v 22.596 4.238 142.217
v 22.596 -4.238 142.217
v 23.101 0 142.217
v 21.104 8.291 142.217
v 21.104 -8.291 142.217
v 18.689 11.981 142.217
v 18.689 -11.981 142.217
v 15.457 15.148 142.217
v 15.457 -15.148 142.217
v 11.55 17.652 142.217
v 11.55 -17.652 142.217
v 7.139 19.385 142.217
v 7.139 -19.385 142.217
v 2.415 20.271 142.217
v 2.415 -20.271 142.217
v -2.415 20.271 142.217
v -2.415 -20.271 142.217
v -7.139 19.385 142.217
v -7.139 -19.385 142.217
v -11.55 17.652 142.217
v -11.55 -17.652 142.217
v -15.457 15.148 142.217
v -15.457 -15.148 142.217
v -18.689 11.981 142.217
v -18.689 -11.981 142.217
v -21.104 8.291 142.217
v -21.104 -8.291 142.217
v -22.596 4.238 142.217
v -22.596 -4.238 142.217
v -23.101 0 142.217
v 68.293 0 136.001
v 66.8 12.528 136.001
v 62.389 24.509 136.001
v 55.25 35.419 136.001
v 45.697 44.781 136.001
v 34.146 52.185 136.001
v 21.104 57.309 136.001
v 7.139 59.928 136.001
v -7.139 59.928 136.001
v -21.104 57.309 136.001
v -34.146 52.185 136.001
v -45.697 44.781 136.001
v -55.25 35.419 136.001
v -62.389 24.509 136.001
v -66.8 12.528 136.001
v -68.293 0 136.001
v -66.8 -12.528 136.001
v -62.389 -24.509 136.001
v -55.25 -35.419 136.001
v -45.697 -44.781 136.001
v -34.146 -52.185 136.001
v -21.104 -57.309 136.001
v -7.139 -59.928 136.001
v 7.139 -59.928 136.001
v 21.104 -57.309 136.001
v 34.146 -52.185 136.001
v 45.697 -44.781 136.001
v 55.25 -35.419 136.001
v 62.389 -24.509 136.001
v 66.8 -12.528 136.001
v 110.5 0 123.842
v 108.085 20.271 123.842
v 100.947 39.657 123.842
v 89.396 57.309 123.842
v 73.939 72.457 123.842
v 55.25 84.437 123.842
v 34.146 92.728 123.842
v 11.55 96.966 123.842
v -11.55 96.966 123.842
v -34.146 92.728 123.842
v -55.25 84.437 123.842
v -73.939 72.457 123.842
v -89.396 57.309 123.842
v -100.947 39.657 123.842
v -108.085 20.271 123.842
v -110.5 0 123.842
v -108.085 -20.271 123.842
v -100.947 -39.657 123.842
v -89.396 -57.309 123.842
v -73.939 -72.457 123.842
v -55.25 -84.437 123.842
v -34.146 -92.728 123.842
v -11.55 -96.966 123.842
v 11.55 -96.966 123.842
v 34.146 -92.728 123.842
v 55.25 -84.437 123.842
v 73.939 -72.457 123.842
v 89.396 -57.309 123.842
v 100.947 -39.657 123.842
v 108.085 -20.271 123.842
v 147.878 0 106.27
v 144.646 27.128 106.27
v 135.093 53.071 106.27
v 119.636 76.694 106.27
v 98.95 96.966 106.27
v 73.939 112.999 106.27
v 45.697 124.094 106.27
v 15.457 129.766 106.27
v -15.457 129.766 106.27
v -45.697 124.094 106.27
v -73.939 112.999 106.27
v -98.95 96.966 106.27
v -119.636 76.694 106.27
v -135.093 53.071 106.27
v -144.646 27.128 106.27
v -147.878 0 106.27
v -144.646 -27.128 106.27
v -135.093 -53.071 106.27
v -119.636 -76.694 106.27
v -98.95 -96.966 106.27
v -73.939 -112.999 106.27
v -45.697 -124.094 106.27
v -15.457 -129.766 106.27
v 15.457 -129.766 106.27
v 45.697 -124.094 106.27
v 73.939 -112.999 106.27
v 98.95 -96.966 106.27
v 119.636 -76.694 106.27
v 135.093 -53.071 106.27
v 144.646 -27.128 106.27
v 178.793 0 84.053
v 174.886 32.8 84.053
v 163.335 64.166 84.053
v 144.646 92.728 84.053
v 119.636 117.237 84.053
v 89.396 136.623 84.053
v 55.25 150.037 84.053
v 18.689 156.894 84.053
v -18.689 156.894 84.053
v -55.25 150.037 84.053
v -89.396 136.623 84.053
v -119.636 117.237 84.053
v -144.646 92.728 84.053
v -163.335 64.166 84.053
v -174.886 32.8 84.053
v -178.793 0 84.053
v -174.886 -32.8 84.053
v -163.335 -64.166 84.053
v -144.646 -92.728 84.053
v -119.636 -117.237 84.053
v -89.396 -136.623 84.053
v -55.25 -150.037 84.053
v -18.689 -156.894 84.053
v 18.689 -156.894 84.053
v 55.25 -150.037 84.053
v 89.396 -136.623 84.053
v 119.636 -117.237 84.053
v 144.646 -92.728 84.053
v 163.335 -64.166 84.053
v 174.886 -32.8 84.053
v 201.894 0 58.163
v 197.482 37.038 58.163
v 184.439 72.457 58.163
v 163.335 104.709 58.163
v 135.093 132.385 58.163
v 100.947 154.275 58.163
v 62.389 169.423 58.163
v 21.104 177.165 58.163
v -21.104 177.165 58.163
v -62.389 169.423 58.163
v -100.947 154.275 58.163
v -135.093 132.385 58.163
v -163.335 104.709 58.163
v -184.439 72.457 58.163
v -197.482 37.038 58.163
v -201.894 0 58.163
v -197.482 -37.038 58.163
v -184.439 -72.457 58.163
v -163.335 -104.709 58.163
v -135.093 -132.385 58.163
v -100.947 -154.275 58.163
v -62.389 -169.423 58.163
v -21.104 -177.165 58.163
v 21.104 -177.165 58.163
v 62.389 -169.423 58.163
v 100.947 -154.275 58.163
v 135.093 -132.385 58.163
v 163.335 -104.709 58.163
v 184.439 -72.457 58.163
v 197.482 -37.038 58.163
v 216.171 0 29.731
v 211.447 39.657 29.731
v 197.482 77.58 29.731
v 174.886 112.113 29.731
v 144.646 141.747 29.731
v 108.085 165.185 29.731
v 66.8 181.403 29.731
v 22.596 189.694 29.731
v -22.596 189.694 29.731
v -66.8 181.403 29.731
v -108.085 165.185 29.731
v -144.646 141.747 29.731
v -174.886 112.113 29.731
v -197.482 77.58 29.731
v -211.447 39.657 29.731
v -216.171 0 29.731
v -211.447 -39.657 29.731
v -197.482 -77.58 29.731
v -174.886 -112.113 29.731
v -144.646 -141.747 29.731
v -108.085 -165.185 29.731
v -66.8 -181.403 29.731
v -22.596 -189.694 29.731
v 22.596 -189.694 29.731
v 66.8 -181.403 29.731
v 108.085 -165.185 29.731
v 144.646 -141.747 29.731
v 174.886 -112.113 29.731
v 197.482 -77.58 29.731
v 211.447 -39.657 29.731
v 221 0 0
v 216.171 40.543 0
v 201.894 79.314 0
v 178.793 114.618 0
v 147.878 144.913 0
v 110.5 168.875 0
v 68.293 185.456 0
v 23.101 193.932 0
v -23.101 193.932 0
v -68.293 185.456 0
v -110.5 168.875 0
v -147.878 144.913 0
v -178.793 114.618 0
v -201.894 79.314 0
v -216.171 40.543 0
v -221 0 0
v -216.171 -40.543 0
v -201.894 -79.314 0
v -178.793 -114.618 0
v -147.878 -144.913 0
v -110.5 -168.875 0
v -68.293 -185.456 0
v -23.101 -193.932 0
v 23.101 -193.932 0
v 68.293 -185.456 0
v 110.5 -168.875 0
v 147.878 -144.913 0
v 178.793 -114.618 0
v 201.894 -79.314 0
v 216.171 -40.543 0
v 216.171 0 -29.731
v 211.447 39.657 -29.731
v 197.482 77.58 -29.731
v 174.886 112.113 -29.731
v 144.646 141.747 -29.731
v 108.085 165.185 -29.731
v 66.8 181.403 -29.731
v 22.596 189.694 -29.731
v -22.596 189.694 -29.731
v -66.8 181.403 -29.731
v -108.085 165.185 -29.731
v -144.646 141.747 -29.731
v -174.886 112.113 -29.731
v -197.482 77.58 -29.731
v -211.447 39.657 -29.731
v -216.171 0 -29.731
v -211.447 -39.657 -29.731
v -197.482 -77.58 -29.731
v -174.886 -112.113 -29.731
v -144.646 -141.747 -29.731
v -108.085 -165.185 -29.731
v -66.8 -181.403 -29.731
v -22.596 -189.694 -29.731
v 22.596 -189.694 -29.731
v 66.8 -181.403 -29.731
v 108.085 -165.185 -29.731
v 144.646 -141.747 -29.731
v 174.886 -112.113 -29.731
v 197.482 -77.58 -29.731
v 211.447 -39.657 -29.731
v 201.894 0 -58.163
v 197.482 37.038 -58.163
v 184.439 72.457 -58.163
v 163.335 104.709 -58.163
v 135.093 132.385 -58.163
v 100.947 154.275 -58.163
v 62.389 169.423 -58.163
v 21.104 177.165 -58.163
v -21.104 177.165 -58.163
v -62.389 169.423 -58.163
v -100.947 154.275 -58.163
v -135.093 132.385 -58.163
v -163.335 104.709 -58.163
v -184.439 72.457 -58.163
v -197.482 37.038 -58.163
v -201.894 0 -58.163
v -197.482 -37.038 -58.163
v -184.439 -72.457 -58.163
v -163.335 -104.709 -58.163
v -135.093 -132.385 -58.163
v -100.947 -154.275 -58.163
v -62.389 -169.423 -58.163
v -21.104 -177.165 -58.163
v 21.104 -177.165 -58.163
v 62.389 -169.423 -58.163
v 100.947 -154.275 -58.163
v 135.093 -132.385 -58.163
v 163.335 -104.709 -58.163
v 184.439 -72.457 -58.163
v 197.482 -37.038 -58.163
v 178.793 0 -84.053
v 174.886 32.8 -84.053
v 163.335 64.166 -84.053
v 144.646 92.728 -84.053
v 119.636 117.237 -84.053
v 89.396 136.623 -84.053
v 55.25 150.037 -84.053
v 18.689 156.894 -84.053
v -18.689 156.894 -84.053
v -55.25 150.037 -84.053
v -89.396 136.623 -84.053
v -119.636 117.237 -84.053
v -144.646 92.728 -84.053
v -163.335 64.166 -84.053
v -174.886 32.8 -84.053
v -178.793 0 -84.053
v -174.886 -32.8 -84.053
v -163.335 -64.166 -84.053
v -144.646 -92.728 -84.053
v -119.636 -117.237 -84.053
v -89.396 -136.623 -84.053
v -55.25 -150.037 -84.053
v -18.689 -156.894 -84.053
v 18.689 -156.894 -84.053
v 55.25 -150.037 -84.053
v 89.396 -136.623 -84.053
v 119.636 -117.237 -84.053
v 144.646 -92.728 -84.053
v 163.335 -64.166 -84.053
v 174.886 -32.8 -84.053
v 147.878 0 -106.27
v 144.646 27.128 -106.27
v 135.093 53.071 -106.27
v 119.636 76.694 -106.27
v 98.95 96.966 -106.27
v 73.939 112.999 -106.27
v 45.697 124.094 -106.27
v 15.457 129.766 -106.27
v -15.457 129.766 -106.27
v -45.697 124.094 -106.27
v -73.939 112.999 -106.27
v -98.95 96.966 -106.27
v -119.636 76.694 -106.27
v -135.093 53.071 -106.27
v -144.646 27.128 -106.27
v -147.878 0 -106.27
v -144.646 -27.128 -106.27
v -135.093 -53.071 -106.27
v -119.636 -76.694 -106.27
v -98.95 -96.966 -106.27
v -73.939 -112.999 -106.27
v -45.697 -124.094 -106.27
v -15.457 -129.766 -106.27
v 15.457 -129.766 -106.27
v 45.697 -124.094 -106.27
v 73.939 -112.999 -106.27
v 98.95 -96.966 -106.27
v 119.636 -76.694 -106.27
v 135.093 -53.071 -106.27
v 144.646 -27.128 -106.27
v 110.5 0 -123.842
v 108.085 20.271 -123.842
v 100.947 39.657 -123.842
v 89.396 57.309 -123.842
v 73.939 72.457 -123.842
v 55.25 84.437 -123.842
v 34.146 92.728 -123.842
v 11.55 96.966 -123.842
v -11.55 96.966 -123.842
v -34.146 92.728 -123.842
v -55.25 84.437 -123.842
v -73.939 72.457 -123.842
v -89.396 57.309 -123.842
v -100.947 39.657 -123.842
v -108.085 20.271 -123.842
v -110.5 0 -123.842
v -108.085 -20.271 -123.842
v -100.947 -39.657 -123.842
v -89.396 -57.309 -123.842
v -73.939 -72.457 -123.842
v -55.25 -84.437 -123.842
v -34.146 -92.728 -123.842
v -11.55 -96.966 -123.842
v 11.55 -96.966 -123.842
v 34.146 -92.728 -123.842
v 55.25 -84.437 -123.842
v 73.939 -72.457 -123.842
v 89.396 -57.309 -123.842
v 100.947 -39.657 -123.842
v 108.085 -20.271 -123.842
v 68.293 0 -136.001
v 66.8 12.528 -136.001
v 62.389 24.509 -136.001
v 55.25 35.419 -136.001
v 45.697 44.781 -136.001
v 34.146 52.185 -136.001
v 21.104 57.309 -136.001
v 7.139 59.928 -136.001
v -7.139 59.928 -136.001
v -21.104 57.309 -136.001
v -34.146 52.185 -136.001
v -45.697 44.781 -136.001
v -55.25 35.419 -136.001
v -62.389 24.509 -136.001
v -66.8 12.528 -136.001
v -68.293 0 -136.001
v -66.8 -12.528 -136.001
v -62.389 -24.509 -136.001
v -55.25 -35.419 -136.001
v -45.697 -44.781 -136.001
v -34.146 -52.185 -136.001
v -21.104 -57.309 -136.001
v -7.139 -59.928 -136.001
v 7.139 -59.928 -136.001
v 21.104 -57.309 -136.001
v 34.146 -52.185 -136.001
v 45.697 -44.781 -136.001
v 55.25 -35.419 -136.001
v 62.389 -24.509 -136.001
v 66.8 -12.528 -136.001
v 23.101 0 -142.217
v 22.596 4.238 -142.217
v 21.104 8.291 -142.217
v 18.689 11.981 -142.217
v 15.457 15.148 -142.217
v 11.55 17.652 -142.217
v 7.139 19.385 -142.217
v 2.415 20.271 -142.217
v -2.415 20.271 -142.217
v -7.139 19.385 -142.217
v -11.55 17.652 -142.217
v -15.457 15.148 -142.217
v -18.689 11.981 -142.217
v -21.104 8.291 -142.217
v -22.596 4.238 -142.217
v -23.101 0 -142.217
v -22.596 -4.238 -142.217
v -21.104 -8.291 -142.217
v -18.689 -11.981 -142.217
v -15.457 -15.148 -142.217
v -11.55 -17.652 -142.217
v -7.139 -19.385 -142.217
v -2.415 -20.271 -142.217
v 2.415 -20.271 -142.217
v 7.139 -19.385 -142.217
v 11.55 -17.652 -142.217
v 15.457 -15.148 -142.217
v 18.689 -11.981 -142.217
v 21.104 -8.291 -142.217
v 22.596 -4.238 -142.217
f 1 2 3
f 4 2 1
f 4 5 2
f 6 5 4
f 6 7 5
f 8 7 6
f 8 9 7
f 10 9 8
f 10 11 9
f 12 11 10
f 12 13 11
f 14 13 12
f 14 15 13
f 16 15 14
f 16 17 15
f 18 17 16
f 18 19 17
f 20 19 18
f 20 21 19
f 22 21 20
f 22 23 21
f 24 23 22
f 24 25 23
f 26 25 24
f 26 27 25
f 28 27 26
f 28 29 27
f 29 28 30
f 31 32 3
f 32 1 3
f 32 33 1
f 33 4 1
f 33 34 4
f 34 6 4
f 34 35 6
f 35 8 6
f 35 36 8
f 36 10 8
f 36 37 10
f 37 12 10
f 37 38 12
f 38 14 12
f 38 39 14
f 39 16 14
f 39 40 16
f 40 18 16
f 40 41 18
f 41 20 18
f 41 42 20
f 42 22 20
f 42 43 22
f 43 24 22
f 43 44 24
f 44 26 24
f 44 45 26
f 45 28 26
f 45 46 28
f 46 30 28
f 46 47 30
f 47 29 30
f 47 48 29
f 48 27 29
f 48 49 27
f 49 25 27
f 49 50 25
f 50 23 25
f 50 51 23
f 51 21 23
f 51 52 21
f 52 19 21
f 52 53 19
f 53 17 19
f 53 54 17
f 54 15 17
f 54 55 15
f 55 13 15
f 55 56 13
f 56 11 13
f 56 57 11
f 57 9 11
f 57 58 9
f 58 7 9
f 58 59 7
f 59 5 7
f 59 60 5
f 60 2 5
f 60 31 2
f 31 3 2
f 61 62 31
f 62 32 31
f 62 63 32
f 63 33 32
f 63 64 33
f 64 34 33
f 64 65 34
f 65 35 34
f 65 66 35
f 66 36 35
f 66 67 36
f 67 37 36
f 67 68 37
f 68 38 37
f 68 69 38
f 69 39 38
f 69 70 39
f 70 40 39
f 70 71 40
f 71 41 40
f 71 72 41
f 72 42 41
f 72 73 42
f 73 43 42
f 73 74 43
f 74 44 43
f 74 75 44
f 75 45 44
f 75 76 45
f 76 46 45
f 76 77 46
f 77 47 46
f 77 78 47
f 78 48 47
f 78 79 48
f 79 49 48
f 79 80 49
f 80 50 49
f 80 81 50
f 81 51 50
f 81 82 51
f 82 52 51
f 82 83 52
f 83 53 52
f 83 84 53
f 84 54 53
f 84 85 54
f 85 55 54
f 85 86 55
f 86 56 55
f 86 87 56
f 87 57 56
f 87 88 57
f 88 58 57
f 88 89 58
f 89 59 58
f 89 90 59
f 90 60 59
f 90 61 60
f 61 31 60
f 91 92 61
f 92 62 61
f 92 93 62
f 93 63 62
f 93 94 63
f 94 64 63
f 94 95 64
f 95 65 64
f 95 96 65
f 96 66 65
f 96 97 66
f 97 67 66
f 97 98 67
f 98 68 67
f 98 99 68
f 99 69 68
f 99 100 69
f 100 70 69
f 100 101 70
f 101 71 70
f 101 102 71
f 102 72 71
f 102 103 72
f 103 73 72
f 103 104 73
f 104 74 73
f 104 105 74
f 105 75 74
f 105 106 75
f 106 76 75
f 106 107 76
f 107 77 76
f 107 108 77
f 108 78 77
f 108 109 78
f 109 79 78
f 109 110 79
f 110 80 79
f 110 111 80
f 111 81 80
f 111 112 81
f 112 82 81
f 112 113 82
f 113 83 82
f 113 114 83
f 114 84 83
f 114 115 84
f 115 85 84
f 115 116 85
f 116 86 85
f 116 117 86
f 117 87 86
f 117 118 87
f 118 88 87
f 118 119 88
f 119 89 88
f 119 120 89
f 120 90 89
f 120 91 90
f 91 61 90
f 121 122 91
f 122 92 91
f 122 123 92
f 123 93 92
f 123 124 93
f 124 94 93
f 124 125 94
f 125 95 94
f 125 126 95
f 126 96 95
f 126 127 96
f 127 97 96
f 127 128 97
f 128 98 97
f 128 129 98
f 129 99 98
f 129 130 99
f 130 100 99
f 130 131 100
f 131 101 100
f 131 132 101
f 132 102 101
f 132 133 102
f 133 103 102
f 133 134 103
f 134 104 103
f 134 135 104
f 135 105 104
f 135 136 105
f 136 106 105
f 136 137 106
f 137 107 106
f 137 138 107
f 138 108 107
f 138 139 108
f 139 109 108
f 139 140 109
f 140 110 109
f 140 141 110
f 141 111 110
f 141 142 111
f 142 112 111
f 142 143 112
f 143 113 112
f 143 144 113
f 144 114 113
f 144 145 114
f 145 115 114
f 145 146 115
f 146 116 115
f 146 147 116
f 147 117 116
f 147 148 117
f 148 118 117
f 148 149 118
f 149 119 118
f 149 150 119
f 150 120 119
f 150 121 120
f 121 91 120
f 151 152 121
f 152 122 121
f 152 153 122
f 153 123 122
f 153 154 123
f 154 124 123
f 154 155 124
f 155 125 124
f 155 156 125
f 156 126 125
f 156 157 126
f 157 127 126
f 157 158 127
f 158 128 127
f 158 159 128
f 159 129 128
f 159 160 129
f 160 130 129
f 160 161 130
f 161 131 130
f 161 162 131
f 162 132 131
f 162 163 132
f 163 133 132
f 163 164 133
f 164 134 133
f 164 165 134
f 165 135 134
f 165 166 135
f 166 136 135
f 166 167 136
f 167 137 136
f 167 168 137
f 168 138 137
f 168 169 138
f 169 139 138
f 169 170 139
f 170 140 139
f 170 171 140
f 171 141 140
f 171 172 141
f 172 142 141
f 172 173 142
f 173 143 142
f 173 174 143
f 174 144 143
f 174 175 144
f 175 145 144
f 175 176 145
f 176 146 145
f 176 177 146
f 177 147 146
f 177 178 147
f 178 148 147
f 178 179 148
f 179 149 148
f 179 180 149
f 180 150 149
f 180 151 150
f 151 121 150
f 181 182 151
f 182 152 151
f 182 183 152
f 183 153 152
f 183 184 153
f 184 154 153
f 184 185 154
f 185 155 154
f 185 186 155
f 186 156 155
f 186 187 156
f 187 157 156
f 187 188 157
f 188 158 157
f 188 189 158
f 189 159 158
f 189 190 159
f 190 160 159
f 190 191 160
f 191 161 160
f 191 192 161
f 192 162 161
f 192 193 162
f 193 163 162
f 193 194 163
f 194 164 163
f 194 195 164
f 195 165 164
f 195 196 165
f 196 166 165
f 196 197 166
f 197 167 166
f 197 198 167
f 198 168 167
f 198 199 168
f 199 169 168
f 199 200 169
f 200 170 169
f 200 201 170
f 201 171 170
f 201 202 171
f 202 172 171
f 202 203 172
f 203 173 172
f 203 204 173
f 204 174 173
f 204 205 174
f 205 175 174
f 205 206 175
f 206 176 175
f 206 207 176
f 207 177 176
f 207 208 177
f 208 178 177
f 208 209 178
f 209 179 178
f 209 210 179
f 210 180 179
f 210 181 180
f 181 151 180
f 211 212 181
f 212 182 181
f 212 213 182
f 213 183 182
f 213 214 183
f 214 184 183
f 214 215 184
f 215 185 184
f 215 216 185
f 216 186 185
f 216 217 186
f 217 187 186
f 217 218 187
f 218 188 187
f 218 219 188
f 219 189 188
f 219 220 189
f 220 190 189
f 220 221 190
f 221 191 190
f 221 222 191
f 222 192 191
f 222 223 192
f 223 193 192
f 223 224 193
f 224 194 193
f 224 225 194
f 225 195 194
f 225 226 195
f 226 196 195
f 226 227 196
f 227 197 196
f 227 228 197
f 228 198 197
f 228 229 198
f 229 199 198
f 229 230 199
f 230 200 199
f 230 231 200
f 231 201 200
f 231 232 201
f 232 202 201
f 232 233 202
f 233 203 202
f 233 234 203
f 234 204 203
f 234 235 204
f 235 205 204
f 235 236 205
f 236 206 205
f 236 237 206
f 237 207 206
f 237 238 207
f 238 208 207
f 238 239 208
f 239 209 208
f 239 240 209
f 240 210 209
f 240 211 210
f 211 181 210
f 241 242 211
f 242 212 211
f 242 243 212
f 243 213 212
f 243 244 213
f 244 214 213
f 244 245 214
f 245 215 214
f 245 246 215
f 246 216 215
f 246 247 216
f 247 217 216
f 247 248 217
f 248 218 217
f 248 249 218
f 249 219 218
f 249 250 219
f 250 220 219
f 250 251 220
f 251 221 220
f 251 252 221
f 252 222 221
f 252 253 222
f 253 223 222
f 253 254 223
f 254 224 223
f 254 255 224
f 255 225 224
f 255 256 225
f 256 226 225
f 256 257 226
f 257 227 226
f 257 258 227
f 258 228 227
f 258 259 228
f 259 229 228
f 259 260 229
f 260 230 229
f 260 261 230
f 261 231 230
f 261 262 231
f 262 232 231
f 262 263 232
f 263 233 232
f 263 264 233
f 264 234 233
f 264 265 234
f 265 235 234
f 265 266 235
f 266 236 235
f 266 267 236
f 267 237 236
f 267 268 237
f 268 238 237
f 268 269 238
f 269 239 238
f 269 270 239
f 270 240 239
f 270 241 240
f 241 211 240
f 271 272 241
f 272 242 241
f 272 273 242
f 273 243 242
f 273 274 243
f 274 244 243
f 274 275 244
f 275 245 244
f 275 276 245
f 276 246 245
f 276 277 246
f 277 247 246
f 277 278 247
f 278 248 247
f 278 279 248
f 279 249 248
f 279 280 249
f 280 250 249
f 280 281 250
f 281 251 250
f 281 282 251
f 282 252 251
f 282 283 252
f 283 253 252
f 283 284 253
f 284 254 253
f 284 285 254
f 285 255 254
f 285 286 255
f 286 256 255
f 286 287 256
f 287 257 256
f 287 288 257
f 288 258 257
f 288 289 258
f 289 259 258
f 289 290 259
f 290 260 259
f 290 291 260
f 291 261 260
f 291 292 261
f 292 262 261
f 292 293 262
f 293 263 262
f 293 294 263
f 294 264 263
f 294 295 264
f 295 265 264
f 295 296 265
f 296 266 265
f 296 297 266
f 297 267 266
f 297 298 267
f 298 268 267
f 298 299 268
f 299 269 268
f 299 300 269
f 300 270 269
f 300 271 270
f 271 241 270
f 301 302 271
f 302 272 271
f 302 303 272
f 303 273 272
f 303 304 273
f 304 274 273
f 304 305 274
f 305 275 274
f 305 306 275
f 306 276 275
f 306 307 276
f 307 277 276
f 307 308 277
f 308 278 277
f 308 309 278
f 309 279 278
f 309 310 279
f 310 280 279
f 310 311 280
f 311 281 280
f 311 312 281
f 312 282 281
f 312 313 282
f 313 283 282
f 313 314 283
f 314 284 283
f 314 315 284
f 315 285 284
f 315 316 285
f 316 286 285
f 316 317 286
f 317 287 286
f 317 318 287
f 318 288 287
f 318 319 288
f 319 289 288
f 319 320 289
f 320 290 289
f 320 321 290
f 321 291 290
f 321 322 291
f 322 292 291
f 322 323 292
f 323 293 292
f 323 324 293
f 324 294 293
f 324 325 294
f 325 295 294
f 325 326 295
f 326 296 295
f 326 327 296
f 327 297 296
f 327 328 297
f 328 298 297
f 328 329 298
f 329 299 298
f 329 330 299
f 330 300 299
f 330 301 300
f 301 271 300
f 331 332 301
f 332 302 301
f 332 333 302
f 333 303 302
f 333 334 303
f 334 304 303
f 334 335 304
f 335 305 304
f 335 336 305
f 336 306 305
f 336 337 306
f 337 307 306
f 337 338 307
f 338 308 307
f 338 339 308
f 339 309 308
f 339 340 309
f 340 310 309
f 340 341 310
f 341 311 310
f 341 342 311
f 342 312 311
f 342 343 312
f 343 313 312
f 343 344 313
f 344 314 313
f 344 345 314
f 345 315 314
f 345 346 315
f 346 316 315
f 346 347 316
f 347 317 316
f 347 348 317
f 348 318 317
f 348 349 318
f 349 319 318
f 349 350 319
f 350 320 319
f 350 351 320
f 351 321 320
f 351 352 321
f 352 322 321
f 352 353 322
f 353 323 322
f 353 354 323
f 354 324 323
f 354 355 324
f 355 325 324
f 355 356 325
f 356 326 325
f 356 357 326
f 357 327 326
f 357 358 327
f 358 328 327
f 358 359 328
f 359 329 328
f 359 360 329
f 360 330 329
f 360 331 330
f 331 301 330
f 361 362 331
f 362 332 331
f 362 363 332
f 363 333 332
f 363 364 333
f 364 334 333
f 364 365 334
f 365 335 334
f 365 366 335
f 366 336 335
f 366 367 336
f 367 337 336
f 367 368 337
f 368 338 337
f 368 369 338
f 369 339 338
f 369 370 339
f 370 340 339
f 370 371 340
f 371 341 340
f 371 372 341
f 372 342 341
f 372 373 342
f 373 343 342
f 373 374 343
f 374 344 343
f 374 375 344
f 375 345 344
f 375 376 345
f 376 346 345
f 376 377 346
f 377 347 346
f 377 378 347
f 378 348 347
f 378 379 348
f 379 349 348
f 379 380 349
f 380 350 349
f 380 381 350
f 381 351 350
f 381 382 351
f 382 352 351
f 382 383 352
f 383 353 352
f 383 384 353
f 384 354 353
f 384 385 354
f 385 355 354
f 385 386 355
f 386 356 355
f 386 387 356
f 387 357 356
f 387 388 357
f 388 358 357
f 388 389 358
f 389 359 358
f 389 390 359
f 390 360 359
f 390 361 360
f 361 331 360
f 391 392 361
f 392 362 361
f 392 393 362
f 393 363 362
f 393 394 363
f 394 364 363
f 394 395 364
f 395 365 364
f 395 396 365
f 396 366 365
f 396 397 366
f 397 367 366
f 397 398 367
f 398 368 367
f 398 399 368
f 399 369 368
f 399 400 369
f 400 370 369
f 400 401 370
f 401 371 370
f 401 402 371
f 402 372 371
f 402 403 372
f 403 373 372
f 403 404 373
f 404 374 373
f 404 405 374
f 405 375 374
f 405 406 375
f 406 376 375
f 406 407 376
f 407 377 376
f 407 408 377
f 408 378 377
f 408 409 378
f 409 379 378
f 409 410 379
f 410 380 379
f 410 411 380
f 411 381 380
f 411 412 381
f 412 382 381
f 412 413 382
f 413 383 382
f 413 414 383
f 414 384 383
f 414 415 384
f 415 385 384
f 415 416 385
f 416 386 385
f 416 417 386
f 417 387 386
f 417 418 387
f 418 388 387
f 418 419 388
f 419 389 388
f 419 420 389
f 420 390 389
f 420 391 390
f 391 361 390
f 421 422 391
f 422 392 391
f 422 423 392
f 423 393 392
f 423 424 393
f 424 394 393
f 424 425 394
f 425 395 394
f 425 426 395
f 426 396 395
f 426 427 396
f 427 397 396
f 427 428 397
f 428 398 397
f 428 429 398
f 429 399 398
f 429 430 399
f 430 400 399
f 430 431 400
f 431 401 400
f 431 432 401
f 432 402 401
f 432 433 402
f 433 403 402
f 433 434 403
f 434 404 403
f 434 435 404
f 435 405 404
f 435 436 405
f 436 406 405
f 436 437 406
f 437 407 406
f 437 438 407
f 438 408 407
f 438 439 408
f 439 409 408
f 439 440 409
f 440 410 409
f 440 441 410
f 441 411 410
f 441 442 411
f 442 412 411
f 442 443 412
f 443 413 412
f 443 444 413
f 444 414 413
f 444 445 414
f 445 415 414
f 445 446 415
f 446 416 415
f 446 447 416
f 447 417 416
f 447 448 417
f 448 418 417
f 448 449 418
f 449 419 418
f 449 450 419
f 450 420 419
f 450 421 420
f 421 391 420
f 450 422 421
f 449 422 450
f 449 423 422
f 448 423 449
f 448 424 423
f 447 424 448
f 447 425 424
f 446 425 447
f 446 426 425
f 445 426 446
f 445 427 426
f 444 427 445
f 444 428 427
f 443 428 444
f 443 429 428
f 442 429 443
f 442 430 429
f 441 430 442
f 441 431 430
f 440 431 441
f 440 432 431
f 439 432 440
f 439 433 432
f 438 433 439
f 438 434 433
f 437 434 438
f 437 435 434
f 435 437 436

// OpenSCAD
// Generated by SolidPython 1.0.1 on 2020-07-29 00:46:53


scale(v = [17, 15, 11]) {
	sphere(r = 13);
}
/***********************************************
*********      SolidPython code:      **********
************************************************
 
# import packages: SolidPython
from solid import *
from solid.utils import *
from itertools import chain, combinations, permutations


class Resize:

    def __init__(self, scad_file):
        self.scad_file = scad_file
        #self.scad_file = import_scad(scad_file)
        # cone/cylinder param:
        self.r1 = 0
        self.r2 = 0
        self.h = 0
        # rectangular prism param:
        self.w = 0
        self.l = 0
        # ellipse param:
        self.r = 0

    # import OpenScad code (file name corresponds to shape)


    # classify shape + parameters
    def assign(self, param1, param2, param3):
        if self.scad_file == 'cone.scad':
            self.r1 = param1
            self.r2 = param2
            self.h = param3
        elif self.scad_file == 'cylinder.scad':
            self.r1 = param1
            self.r2 = param2
            self.h = param3
        elif self.scad_file == 'rectangularPrism.scad':
            self.h = param1
            self.l = param2
            self.w = param3
        else:
            self.r = param1
            self.h = param2

    # resize parameters
    def iterate(self):
        x = range(3, 20, 2)
        i = 1
        if self.scad_file == 'cone.scad':
            tempList = list(permutations(x, 2))
            for temp in tempList:
                param1 = temp[0]
                param2 = temp[1]
                filepath = 'produced_scad_files/' + 'cone' + str(param1) + '_' + str(param2) + '_' + '.scad'
                scad_render_to_file(cylinder(h=param1, r1=param2, r2=0), filepath)

        elif self.scad_file == 'cylinder.scad':
            tempList = list(permutations(x, 3))
            for temp in tempList:
                param1 = temp[0]
                param2 = temp[1]
                filepath = 'produced_scad_files/' + 'cylinder' + str(param1) + '_' + str(param2) + '_' + '.scad'
                scad_render_to_file(cylinder(h=param1, r1=param2, r2=param2), filepath)

        elif self.scad_file == 'rectangularPrism.scad':
            tempList = list(permutations(x, 3))
            for temp in tempList:
                param1 = temp[0]
                param2 = temp[1]
                param3 = temp[2]
                filepath = 'produced_scad_files/' + 'rectangularPrism' + str(param1) + '_' + str(param2) + '_' + str(
                    param3) + '.scad'
                scad_render_to_file(cube(size=(param1, param2, param3)), filepath)

        elif self.scad_file == 'ellipse.scad':
            tempList = list(permutations(x, 4))
            for temp in tempList:
                param1 = temp[0]
                param2 = temp[1]
                param3 = temp[2]
                param4 = temp[3]
                filepath = 'produced_scad_files/' + 'ellipse' + str(param1) + '_' + str(param2) + '_' + str(param3) + '_' + str(param4) + '.scad'
                scad_render_to_file(scale([param1, param2, param3])(sphere(r=param4)), filepath)

    def render_to_scadfile(self):
        scad_render_to_file(scad, 'example.scad') 
 
************************************************/
